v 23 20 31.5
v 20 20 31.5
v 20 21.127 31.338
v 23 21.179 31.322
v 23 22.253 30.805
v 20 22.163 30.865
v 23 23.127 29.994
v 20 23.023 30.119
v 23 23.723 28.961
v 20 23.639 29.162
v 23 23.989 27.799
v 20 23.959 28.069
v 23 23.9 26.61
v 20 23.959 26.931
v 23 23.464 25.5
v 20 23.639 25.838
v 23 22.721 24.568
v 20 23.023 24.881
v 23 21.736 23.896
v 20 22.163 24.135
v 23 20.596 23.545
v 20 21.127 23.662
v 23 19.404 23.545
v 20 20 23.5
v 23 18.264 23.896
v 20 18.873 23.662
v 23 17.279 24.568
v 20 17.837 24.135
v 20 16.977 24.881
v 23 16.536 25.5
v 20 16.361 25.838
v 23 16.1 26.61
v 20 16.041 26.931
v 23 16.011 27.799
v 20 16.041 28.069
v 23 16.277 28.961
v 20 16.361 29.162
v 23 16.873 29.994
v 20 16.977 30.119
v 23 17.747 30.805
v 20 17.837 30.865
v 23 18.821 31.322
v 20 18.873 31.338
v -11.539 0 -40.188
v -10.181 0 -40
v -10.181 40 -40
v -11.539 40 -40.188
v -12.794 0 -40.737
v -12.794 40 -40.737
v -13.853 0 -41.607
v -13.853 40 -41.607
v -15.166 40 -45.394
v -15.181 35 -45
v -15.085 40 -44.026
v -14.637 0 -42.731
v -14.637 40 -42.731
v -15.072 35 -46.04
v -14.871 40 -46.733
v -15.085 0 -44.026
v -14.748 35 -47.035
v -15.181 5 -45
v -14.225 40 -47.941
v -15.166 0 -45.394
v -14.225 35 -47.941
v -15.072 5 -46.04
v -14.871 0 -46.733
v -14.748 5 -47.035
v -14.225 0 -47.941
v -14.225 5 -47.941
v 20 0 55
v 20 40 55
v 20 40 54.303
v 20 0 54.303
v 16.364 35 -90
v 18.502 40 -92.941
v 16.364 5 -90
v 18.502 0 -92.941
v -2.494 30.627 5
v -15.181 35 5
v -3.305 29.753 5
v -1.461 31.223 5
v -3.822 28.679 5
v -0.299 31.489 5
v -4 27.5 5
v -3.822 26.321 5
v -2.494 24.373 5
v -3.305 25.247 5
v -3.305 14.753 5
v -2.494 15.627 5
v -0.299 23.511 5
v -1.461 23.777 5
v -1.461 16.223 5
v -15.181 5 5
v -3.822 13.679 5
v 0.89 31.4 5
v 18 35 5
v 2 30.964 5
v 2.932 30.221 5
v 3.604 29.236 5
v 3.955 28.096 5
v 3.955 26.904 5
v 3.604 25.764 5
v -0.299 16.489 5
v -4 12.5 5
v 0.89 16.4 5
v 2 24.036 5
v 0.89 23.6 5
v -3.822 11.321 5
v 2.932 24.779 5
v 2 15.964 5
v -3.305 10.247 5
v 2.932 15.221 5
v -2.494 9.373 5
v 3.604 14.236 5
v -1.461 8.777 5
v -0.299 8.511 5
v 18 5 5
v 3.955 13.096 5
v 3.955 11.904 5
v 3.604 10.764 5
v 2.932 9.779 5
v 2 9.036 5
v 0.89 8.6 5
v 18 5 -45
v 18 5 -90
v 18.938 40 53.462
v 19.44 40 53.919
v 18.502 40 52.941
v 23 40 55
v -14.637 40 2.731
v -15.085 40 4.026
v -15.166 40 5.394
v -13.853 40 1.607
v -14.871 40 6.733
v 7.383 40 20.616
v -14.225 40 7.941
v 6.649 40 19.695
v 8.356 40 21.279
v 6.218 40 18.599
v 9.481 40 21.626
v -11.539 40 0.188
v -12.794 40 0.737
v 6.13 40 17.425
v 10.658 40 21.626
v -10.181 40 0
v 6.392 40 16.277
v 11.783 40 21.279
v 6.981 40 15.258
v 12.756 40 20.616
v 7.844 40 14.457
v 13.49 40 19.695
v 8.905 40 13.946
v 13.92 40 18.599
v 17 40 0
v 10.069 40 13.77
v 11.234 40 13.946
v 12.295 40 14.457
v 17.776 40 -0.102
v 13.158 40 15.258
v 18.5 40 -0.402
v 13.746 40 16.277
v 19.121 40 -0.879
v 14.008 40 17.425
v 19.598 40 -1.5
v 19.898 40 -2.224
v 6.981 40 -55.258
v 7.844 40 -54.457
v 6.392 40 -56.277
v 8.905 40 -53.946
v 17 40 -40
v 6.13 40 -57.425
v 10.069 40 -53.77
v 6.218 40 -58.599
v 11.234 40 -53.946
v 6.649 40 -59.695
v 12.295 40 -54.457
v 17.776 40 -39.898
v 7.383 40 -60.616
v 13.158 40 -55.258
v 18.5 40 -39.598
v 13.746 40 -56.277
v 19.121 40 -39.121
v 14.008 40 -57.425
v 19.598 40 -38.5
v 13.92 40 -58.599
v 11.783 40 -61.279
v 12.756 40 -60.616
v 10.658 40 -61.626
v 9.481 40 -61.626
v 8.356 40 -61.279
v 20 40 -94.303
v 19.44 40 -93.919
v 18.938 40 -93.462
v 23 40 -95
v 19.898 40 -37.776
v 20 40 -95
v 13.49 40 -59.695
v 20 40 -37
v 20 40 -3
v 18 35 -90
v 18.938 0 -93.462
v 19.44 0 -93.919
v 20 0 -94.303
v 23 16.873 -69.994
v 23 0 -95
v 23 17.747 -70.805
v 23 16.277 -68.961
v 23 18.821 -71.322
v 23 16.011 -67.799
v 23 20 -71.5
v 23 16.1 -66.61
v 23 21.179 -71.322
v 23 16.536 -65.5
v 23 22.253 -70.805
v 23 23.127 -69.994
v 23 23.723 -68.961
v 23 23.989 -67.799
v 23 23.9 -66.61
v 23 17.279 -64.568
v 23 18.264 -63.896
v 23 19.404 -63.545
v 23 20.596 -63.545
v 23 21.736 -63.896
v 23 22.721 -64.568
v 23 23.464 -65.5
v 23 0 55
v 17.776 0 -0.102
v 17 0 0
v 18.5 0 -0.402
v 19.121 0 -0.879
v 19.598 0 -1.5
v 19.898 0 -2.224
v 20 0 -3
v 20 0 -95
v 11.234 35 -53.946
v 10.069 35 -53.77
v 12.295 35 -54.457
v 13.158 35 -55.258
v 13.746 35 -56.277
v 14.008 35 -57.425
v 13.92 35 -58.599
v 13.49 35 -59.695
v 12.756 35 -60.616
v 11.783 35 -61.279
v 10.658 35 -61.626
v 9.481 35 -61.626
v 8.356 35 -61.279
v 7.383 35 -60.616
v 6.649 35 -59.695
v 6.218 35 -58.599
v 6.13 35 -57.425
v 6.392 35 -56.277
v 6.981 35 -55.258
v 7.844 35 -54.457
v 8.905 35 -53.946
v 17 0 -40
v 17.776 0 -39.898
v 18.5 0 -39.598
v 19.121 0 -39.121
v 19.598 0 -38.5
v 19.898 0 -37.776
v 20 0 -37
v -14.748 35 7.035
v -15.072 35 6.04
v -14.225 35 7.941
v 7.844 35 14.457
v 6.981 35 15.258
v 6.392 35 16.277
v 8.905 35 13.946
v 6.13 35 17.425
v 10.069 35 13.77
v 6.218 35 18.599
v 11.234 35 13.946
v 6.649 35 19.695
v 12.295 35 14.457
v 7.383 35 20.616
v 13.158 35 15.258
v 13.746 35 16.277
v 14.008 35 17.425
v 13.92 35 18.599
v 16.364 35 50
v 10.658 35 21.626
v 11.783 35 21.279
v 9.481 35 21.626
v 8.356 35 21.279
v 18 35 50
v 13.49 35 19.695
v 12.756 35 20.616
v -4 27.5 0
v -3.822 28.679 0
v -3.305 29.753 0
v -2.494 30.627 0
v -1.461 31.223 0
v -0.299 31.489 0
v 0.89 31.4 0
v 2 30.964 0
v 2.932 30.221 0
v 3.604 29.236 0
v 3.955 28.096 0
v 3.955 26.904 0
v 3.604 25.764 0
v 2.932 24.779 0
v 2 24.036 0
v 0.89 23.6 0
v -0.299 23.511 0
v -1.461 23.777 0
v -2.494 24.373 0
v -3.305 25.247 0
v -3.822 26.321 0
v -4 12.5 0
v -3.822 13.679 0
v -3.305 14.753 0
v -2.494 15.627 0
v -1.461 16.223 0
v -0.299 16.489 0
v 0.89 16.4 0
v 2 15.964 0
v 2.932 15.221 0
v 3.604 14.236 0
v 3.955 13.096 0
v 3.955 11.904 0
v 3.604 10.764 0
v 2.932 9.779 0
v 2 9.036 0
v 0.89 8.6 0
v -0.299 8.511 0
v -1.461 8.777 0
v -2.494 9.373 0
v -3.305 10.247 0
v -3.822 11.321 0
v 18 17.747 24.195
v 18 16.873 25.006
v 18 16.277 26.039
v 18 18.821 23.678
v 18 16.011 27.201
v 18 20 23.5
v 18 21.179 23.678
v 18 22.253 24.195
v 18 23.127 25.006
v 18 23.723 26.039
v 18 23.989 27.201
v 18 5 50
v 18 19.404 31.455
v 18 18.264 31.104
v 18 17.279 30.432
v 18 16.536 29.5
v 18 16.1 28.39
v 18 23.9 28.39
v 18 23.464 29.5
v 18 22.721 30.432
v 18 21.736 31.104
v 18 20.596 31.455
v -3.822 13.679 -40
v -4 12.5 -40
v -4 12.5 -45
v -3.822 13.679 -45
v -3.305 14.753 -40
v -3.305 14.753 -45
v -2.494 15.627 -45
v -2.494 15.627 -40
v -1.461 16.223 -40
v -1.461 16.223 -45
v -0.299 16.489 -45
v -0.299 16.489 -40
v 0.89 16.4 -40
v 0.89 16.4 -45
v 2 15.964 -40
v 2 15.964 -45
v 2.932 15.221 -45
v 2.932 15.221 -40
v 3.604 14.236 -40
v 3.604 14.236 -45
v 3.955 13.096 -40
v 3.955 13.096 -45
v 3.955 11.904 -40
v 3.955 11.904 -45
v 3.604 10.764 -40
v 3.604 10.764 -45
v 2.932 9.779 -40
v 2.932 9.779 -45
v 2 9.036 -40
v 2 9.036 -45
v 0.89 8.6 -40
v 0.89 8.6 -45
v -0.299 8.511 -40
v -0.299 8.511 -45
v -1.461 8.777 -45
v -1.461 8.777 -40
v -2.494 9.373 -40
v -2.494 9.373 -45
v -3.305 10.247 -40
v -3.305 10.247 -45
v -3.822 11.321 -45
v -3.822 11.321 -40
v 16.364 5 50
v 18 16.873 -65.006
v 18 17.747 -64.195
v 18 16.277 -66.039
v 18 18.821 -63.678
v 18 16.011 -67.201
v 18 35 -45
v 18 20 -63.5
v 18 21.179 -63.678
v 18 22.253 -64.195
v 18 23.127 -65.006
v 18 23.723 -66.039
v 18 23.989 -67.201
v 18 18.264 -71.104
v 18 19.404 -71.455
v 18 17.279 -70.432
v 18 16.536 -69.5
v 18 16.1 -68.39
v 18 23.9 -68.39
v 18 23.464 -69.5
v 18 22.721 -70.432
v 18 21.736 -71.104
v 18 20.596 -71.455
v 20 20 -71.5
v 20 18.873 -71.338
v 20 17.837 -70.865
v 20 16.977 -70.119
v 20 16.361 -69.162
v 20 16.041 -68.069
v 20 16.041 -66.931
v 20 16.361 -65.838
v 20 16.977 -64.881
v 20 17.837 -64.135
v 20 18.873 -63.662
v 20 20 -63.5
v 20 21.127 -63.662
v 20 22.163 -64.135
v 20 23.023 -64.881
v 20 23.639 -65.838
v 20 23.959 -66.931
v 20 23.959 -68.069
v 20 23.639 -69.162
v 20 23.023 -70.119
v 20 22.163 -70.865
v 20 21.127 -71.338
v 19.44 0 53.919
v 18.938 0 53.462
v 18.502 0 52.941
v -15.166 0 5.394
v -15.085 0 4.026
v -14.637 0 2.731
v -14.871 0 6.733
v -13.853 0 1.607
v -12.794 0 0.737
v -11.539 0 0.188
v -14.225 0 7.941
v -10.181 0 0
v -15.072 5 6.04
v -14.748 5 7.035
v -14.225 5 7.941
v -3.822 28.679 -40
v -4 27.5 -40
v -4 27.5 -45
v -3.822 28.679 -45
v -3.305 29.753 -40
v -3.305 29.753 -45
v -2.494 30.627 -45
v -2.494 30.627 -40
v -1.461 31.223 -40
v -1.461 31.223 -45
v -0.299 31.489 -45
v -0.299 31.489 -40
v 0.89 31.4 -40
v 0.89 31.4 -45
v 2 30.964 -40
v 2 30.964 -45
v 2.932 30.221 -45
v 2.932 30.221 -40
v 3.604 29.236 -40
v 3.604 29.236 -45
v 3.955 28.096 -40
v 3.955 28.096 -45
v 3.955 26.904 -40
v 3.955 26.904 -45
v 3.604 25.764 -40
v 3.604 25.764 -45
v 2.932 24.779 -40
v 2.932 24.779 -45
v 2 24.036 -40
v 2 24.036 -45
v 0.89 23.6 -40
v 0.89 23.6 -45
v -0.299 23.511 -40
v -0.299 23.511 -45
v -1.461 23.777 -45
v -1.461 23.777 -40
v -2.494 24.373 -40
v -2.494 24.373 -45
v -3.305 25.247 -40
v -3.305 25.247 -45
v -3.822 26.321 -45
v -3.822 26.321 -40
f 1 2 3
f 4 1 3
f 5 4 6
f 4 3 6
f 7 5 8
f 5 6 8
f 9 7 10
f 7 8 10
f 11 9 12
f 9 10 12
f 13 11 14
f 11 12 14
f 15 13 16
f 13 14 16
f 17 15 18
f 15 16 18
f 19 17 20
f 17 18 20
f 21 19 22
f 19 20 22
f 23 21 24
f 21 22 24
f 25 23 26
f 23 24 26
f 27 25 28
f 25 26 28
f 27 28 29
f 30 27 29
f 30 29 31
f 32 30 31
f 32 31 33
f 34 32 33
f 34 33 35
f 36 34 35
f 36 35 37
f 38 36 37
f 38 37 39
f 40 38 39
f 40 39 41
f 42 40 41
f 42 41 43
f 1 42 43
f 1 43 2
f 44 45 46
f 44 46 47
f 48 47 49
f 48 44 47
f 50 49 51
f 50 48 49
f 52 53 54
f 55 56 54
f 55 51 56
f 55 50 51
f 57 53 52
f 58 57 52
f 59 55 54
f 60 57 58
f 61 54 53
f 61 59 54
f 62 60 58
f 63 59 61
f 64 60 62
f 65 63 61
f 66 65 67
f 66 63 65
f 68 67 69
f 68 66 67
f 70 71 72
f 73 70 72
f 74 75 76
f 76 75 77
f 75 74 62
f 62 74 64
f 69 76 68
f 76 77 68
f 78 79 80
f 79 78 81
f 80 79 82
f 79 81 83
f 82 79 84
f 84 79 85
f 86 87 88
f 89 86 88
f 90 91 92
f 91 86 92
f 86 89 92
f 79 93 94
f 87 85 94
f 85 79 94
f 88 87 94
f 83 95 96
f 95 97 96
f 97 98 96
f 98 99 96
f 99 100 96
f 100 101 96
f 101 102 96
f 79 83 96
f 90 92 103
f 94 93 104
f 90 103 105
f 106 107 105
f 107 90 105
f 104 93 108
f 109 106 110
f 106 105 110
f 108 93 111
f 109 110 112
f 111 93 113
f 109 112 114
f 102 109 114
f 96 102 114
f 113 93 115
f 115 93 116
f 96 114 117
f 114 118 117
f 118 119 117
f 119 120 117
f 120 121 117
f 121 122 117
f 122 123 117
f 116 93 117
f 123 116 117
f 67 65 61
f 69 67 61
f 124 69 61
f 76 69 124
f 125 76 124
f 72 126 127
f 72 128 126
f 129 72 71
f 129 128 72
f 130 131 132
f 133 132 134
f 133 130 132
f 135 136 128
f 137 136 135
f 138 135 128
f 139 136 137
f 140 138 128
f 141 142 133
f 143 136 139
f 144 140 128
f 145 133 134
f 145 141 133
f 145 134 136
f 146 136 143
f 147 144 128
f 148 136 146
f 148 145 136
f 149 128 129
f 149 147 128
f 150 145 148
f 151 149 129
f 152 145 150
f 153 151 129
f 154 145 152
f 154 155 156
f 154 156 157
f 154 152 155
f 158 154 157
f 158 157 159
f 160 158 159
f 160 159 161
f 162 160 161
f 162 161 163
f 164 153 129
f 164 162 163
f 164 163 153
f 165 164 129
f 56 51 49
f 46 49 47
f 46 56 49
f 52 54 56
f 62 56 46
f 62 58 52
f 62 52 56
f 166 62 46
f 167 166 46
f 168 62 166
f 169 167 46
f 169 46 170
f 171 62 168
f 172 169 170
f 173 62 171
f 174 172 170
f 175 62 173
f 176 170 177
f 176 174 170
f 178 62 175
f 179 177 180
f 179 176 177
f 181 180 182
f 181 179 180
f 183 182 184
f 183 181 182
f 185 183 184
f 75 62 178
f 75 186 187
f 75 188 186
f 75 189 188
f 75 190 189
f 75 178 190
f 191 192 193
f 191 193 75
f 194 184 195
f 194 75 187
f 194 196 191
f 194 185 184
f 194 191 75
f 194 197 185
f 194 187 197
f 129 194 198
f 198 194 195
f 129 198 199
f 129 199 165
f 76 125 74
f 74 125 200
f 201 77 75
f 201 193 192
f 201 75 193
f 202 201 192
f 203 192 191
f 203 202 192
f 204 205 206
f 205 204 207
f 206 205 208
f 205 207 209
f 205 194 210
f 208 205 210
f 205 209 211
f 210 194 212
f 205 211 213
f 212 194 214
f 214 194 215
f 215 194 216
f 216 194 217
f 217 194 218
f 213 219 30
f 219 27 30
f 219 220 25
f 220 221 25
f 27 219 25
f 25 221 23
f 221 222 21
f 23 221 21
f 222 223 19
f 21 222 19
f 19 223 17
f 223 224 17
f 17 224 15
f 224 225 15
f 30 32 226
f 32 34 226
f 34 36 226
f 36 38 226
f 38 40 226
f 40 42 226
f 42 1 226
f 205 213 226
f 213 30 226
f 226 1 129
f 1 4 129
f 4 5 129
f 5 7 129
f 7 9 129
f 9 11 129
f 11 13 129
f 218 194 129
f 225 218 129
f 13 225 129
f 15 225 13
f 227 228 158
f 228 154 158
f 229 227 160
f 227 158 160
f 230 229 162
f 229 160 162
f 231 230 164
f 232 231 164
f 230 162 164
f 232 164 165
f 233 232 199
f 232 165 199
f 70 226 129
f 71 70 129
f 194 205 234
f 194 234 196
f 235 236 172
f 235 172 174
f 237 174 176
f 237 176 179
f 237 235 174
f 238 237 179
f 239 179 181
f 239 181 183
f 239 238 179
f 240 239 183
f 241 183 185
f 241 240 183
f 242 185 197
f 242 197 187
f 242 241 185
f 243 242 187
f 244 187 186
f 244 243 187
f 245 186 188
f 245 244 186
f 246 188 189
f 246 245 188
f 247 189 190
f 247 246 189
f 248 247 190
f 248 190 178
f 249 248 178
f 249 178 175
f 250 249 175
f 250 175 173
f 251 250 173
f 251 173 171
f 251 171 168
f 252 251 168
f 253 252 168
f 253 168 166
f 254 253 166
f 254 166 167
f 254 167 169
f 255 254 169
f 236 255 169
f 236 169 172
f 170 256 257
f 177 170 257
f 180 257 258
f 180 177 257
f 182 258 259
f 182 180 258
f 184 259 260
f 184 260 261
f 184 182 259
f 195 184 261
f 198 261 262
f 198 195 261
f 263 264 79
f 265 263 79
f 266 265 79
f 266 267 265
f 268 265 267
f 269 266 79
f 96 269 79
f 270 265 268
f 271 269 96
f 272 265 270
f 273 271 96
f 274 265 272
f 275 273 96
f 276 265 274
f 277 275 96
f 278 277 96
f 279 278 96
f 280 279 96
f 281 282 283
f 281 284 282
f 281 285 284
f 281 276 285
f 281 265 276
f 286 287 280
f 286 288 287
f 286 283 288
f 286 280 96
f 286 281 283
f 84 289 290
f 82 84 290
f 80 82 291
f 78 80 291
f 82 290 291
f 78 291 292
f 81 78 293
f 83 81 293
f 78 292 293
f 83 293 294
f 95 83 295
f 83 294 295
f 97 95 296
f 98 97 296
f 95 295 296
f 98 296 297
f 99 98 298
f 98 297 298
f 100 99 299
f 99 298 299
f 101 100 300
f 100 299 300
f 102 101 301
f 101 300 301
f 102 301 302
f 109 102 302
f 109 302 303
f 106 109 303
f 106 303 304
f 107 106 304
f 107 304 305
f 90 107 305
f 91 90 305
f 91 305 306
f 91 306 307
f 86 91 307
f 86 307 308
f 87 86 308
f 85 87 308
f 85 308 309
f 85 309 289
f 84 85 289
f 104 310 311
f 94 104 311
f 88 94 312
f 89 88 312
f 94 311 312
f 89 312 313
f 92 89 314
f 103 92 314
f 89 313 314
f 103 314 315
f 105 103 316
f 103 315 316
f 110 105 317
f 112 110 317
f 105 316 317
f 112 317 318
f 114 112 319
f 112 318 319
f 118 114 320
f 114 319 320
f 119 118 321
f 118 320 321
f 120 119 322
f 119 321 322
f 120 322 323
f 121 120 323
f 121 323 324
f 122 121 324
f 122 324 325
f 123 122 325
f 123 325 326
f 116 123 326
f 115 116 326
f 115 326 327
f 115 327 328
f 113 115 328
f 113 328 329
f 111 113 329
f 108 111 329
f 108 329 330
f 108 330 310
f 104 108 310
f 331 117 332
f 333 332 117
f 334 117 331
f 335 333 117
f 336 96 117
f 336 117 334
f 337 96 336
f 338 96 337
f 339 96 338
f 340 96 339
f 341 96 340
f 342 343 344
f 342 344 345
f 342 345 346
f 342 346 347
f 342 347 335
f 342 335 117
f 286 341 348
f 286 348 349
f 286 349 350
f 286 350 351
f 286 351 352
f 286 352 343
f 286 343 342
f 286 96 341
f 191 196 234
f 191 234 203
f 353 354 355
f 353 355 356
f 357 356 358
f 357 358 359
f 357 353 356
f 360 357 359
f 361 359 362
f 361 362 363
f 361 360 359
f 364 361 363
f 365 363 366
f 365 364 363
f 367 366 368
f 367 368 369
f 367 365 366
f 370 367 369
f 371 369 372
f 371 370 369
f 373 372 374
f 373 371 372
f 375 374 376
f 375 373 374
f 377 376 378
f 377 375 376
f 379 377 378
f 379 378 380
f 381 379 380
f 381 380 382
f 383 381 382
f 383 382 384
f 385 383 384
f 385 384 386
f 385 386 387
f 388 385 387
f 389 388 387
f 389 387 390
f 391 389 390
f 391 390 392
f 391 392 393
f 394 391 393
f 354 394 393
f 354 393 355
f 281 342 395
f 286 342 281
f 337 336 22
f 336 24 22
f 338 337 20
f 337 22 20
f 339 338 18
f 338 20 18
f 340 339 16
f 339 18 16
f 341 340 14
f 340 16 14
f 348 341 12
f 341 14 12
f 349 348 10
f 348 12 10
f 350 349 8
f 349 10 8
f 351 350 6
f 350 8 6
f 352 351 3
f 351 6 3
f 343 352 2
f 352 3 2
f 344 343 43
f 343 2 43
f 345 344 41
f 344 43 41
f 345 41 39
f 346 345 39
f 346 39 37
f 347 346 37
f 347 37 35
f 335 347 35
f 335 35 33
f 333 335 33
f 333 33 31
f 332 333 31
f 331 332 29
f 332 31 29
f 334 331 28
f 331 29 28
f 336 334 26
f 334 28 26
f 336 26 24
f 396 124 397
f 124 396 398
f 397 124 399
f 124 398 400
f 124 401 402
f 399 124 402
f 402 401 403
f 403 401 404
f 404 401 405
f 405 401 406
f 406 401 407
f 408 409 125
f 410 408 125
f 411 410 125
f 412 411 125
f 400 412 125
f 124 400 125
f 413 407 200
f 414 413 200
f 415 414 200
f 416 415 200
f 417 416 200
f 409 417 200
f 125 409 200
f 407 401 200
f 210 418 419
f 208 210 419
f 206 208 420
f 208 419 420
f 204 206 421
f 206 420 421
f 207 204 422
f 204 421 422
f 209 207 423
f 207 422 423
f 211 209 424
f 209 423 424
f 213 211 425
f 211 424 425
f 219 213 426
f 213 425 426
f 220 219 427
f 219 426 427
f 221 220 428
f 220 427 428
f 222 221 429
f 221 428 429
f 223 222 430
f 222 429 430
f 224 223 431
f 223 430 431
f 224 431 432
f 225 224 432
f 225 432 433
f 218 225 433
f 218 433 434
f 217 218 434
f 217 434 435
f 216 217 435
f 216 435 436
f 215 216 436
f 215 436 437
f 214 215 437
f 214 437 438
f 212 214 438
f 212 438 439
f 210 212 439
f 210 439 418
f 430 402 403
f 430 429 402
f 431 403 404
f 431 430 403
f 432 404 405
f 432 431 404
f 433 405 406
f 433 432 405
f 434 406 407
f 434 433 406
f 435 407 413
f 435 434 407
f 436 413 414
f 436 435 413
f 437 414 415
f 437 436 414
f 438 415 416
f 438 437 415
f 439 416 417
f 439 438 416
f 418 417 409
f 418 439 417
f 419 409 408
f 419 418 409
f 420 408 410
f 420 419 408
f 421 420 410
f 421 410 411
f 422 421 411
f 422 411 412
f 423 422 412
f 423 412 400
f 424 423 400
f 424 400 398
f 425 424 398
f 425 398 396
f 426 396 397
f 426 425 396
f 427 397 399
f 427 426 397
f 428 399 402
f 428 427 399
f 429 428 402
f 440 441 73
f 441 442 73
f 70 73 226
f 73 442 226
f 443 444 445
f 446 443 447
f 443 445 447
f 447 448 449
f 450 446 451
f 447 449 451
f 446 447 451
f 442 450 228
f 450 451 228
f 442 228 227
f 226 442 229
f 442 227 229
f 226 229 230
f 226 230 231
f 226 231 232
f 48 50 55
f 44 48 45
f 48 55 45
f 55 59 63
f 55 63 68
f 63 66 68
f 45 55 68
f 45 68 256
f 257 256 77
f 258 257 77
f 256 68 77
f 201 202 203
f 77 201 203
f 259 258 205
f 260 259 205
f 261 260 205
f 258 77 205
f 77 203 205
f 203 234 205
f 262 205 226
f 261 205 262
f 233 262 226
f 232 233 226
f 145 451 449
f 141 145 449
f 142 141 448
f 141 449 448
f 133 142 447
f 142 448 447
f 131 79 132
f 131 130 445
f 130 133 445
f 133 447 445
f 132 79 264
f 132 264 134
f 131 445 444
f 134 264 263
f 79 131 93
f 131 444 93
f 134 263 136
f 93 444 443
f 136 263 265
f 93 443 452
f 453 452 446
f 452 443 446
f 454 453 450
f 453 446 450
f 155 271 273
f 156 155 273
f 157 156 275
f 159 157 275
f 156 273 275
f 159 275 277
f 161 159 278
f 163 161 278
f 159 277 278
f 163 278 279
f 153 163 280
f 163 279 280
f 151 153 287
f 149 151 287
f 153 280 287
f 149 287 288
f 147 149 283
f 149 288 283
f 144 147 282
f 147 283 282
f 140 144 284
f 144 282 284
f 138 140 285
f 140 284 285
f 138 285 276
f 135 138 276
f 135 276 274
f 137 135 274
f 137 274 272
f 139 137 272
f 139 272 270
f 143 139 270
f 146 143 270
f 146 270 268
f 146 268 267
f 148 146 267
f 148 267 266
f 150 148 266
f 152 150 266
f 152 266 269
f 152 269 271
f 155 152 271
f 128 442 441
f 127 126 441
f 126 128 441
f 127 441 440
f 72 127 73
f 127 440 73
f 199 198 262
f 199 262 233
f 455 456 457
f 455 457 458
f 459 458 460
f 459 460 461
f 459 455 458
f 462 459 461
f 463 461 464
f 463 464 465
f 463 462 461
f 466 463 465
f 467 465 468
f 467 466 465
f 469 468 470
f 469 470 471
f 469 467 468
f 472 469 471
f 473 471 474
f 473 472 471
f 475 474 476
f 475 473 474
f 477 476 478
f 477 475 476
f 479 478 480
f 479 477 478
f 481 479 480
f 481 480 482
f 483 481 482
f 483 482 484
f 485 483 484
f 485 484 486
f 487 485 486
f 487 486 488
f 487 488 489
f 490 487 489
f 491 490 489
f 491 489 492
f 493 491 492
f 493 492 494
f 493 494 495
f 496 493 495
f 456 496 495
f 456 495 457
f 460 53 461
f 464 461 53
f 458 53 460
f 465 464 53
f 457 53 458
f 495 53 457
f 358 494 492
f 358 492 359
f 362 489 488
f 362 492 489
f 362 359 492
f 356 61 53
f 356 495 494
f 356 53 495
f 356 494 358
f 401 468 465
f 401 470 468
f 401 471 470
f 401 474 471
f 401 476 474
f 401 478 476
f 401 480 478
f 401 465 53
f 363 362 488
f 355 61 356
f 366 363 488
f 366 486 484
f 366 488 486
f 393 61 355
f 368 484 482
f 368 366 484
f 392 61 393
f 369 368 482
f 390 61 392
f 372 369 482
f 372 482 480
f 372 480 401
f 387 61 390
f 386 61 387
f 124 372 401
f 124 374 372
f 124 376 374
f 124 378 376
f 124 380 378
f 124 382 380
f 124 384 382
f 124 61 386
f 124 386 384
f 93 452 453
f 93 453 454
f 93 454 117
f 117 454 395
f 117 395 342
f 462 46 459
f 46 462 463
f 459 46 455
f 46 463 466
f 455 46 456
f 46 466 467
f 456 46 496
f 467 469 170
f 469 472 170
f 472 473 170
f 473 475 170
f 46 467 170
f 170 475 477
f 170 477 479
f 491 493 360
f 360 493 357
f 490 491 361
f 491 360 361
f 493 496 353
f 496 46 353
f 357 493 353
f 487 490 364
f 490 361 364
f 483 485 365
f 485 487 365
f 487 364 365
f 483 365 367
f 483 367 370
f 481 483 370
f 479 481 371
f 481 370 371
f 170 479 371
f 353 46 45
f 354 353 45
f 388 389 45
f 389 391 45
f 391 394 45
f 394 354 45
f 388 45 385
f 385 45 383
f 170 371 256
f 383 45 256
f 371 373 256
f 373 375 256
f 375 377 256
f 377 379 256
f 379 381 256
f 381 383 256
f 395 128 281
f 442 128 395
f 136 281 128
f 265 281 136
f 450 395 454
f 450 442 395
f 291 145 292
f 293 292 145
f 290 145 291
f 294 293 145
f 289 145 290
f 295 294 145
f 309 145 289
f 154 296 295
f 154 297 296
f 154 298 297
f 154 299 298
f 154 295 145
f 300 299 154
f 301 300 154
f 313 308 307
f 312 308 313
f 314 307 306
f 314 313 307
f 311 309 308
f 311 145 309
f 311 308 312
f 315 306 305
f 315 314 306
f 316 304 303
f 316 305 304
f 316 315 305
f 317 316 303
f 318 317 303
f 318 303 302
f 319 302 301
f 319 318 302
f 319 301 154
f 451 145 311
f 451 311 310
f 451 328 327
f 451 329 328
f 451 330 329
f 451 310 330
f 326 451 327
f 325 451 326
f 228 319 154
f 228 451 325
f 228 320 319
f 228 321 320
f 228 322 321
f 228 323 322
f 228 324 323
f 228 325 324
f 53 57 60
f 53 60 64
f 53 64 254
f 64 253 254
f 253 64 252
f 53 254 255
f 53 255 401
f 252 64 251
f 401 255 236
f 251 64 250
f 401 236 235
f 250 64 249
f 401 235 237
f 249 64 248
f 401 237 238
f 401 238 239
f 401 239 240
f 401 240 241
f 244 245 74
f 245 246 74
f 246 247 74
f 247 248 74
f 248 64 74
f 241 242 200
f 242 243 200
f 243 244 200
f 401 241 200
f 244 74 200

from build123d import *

# Parameters (mm, degrees)
SKETCH2_W                 = 150
SKETCH2_H                 = 40
BOSS_EXTRUDE1_DEPTH       = 3
BOSS_EXTRUDE2_DEPTH       = 40
SHELL3_T                  = -5
FILLET2_R                 = 5
F_8_0MM_DOWEL_HOLE1_D     = 8
F_8_0MM_DOWEL_HOLE2_D     = 8
F_8_0MM_DOWEL_HOLE2_DEPTH = 5
F_8_0MM_DOWEL_HOLE2_TIP   = 2.403442476
CUT_EXTRUDE1_REACH        = 105.822
SKETCH8_R                 = 3.95
FILLET3_R                 = 3
CUT_EXTRUDE2_REACH        = 110.916
SKETCH9_R                 = 4


with BuildPart() as part:
    # Sketch2 → Boss-Extrude1 (new body)
    with BuildSketch(Plane.ZY.offset(-23)):
        with Locations((-20, 20)):
            Rectangle(SKETCH2_W, SKETCH2_H)
    extrude(amount=BOSS_EXTRUDE1_DEPTH)

    # Sketch3 → Boss-Extrude2 (add)
    with BuildSketch(Plane.XZ):
        Polygon((20, 55), (-20, 0), (20, 0), align=None)
    extrude(amount=-BOSS_EXTRUDE2_DEPTH)

    # Shell3
    shell3_openings = [part.faces().sort_by_distance(p)[0] for p in [
        (0, 20, 27.5),
    ]]
    offset(amount=SHELL3_T, openings=shell3_openings, kind=Kind.INTERSECTION)

    # Fillet2
    # the kernel refuses this fillet: 5 mm, written as the material it takes off along each edge
    with BuildSketch(Plane(origin=(20, -6.365307396, 55), x_dir=(1, 0, 0), z_dir=(0, 1, 0))) as fillet2_piece_1:
        with BuildLine():
            CenterArc((FILLET2_R * 0.509224591703, FILLET2_R), FILLET2_R, 216.027373385, 53.972626615)
            Line((-FILLET2_R * 0.2995114926, FILLET2_R * 0.411828302325), (0, 0))
            Line((0, 0), (FILLET2_R * 0.509224591703, 0))
        make_face()
    extrude(amount=52.730614793, mode=Mode.SUBTRACT)
    with BuildSketch(Plane(origin=(-20, -24.547125578, 0), x_dir=(1, 0, 0), z_dir=(0, 1, 0))) as fillet2_piece_2:
        with BuildLine():
            CenterArc((FILLET2_R * 1.96377004625, -FILLET2_R), FILLET2_R, 90, 126.027373385)
            Line((FILLET2_R * 1.15503396195, -FILLET2_R * 1.58817169768), (0, 0))
            Line((0, 0), (FILLET2_R * 1.96377004625, 0))
        make_face()
    extrude(amount=89.094251156, mode=Mode.SUBTRACT)

    # Ø8.0mm Dowel Hole1 (through all)
    with Locations(Plane.XY.offset(5)):
        with Locations((0, 12.5), (0, 27.5)):
            Hole(F_8_0MM_DOWEL_HOLE1_D / 2)

    # Ø8.0mm Dowel Hole2
    with Locations(Plane.ZY.offset(-18)):
        with Locations((27.5, 20)):
            Hole(F_8_0MM_DOWEL_HOLE2_D / 2, depth=F_8_0MM_DOWEL_HOLE2_DEPTH)
            with Locations((0, 0, -(F_8_0MM_DOWEL_HOLE2_DEPTH + F_8_0MM_DOWEL_HOLE2_TIP / 2))):  # 118° drill point
                Cone(0, F_8_0MM_DOWEL_HOLE2_D / 2, F_8_0MM_DOWEL_HOLE2_TIP, mode=Mode.SUBTRACT)

    # Sketch8 → Cut-Extrude1 (cut, up to next)
    with BuildSketch(Plane.XZ.offset(-35), mode=Mode.PRIVATE) as cut_extrude1_sk1:
        with Locations(Location((10.069403087, 17.720429244, 0), (0, 0, 270))):
            Circle(SKETCH8_R)
    cut_extrude1_tool1 = extrude(cut_extrude1_sk1.sketch, amount=-CUT_EXTRUDE1_REACH, mode=Mode.PRIVATE) & part.part
    add(cut_extrude1_tool1.solids().sort_by_distance((10.069403, 35, 17.720429))[0], mode=Mode.SUBTRACT)

    # Mirror2: part across plane


with BuildPart() as part_1:
    add(part.part)
    add(part.part.mirror(Plane.XY.offset(-20)))

    # Fillet3
    fillet3_edges = [part_1.edges().sort_by_distance(p)[0] for p in [
        (20, 20, 0),
        (20, 20, -40),
    ]]
    fillet(fillet3_edges, radius=FILLET3_R)

    # Sketch9 → Cut-Extrude2 (cut, up to next)
    with BuildSketch(Plane.ZY.offset(-20), mode=Mode.PRIVATE) as cut_extrude2_sk1:
        with Locations((27.5, 20)):
            Circle(SKETCH9_R)
    cut_extrude2_tool1 = extrude(cut_extrude2_sk1.sketch, amount=-CUT_EXTRUDE2_REACH, mode=Mode.PRIVATE) & part_1.part
    # Sketch9 → Cut-Extrude2 (cut, up to next)
    with BuildSketch(Plane.ZY.offset(-20), mode=Mode.PRIVATE) as cut_extrude2_sk2:
        with Locations(Location((-67.5, 20, 0), (0, 0, 180))):
            Circle(SKETCH9_R)
    cut_extrude2_tool2 = extrude(cut_extrude2_sk2.sketch, amount=-CUT_EXTRUDE2_REACH, mode=Mode.PRIVATE) & part_1.part
    add(cut_extrude2_tool1.solids().sort_by_distance((20, 20, 27.5))[0], mode=Mode.SUBTRACT)
    add(cut_extrude2_tool2.solids().sort_by_distance((20, 20, -67.5))[0], mode=Mode.SUBTRACT)


solid = part_1.part
